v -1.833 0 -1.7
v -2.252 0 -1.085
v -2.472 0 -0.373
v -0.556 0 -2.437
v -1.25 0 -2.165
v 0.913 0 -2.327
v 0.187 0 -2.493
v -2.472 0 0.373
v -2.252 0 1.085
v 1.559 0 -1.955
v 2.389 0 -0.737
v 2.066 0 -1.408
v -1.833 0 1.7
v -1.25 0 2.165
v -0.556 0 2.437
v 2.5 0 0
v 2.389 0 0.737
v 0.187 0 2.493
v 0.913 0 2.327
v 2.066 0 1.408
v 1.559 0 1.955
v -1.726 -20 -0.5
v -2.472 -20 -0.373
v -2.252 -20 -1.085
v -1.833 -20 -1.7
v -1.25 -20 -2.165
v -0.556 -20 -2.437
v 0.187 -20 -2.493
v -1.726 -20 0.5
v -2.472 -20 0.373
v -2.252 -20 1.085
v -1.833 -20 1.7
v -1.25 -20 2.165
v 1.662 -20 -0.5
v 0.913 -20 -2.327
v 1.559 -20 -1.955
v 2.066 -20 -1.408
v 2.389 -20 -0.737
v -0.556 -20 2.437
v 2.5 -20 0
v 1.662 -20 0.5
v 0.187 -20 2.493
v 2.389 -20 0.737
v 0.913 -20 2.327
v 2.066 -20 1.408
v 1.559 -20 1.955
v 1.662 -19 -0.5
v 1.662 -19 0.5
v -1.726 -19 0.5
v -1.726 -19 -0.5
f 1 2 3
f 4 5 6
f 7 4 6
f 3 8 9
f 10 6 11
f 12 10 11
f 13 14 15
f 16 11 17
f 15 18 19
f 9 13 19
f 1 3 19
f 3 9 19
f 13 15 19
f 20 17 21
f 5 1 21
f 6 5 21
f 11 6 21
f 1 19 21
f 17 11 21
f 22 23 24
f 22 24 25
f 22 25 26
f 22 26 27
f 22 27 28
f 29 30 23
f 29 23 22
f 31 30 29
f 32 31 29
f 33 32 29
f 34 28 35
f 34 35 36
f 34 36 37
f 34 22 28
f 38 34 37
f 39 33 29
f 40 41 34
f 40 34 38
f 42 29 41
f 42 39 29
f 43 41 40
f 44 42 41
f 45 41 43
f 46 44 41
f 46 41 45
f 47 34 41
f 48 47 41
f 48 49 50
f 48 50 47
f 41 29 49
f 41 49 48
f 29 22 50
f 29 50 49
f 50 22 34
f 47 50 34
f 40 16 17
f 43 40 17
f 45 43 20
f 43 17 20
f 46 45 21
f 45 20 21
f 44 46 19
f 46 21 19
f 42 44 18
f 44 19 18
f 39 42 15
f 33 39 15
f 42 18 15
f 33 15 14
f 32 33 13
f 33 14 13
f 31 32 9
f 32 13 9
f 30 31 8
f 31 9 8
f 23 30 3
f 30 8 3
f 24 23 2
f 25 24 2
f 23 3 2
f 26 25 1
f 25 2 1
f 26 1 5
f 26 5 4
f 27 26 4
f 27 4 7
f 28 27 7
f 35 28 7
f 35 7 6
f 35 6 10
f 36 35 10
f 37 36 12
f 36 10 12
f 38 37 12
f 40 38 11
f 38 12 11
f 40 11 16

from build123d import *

# Parameters (mm, degrees)
F0_R     = 2.5
F1_DEPTH = 20
F2_W     = 3.388507
F2_H     = 1
F3_DEPTH = 1


with BuildPart() as f1:
    # F0 (on Front) → F1 (new body)
    with BuildSketch(Plane.XZ):
        Circle(F0_R)
    extrude(amount=F1_DEPTH)

    # F2 (on face) → F3 (cut)
    with BuildSketch(Plane.XZ.offset(20)):
        with Locations((-0.031836, 0)):
            Rectangle(F2_W, F2_H)
    extrude(amount=-F3_DEPTH, mode=Mode.SUBTRACT)


solid = f1.part
